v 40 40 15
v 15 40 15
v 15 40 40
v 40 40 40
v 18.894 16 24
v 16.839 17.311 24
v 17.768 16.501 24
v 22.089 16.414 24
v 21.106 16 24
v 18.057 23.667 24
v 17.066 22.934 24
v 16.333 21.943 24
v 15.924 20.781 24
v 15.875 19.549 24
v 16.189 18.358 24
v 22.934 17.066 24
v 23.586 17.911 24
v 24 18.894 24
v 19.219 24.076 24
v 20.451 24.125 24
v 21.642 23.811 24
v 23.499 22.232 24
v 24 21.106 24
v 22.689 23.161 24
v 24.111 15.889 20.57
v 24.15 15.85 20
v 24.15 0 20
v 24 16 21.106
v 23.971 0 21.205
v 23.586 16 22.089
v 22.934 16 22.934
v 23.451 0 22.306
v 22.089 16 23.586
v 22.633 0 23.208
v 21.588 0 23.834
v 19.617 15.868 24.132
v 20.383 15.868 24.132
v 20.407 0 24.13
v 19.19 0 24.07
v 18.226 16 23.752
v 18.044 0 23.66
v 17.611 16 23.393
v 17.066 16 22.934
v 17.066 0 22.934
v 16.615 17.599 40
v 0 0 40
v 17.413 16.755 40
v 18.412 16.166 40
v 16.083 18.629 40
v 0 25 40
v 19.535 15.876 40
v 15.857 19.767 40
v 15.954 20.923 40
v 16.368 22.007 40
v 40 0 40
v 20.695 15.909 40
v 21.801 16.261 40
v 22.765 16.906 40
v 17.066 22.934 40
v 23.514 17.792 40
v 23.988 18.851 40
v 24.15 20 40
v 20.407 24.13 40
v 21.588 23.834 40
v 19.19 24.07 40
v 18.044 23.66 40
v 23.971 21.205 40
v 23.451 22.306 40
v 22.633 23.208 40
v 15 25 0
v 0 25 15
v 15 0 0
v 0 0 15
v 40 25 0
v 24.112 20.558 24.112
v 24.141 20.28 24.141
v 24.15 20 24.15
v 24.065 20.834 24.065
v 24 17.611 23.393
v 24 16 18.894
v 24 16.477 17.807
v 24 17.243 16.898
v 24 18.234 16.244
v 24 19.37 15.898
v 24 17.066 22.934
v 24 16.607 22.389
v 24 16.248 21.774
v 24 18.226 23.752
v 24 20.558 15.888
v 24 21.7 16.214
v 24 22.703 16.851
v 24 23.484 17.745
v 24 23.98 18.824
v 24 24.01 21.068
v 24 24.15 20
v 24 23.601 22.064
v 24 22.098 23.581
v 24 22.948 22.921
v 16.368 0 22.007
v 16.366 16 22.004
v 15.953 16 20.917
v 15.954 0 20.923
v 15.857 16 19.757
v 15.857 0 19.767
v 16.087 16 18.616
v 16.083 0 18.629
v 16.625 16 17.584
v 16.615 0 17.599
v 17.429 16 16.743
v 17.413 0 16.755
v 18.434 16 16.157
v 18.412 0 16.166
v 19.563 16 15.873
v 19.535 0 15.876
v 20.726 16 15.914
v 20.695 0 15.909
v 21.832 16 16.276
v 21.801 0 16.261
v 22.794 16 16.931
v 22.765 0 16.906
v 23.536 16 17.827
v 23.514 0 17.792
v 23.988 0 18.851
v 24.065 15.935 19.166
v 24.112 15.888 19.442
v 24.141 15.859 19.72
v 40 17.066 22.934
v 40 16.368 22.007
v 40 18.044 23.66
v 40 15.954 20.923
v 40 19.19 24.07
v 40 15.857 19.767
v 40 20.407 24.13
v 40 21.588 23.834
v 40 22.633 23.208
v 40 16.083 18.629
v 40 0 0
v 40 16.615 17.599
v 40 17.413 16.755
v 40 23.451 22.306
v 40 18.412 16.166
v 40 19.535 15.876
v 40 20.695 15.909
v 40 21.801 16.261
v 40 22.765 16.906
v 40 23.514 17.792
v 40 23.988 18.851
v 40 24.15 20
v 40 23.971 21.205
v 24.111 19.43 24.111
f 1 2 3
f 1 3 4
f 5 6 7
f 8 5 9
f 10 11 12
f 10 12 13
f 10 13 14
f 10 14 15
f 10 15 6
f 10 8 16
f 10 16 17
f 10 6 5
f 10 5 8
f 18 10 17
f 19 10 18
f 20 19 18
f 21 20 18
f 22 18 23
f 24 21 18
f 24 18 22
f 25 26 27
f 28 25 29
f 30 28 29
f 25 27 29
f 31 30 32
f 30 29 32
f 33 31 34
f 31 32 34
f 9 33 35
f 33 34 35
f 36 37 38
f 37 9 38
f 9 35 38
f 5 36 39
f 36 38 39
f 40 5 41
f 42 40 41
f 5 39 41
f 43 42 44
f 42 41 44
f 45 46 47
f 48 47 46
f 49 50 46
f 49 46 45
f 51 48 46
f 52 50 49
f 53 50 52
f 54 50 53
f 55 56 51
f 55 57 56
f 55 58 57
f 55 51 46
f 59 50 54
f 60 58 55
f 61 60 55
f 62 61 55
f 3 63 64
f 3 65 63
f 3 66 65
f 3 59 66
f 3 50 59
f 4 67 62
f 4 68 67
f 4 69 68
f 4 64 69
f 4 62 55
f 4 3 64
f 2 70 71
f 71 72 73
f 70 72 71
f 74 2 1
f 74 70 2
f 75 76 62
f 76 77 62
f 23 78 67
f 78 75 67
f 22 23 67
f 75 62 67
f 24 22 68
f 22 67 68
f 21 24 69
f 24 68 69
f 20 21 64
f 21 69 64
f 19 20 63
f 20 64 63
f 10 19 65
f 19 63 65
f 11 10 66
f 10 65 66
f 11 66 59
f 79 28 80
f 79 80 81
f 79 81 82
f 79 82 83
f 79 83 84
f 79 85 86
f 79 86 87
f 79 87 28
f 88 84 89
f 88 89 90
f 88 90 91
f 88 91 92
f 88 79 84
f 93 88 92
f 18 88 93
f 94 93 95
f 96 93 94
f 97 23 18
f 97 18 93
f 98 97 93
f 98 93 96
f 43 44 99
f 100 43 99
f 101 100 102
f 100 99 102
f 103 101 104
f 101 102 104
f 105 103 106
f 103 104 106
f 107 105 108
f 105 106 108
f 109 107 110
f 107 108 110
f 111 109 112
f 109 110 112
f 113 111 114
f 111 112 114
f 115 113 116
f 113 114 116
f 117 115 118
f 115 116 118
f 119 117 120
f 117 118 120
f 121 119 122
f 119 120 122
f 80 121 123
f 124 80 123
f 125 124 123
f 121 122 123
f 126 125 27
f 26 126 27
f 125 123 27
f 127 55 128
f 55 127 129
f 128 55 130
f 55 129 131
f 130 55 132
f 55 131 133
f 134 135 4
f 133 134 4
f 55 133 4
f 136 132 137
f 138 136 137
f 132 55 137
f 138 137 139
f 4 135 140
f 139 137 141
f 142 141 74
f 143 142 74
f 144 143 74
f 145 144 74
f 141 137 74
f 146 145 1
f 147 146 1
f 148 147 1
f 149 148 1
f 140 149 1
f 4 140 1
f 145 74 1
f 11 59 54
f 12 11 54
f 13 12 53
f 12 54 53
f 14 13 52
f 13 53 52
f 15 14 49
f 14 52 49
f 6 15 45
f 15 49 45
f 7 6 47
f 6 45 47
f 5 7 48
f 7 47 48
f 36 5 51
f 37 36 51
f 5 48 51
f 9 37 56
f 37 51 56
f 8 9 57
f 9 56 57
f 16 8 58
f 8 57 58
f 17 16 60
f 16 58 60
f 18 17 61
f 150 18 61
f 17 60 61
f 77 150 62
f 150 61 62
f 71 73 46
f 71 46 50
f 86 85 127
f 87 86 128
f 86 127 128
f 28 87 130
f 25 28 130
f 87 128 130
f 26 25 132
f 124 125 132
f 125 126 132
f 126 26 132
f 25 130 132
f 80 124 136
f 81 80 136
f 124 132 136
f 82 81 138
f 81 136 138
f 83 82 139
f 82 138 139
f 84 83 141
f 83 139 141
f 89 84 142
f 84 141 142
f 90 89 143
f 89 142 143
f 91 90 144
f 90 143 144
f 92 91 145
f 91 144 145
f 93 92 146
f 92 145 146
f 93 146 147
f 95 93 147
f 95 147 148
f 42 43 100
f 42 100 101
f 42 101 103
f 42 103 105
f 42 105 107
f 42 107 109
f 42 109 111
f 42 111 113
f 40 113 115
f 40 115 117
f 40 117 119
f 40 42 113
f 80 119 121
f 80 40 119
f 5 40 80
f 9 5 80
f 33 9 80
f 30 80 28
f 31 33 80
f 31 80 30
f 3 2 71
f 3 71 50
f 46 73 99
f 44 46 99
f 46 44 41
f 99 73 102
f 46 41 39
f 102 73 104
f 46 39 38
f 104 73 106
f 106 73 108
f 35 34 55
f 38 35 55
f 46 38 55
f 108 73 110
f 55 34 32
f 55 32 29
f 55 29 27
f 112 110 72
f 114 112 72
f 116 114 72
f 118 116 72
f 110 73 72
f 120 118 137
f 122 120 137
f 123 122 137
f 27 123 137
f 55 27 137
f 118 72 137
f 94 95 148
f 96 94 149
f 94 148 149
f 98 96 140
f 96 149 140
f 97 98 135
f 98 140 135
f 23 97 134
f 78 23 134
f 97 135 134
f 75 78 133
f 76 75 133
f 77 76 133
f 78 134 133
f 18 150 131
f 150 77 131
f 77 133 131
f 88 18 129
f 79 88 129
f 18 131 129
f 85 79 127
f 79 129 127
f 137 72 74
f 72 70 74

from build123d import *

# Parameters (mm, degrees)
F0_W     = 40
F0_H     = 40
F1_DEPTH = 40
F3_DEPTH = 16
F5_DEPTH = 16
F7_DEPTH = 16
F8_SIZE  = 15


with BuildPart() as f1:
    # F0 (on Top) → F1 (new body)
    with BuildSketch(Plane.XY):
        with Locations((20, 20)):
            Rectangle(F0_W, F0_H)
    extrude(amount=F1_DEPTH)

    # F2 (on face) → F3 (cut)
    with BuildSketch(Plane.XZ):
        with BuildLine():
            ThreePointArc((24.15, 20), (21.5881362443, 23.8341000599), (17.0655068581, 22.9344931419))
            Line((17.0655068581, 22.9344931419), (22.9344931419, 17.0655068581))
            ThreePointArc((22.9344931419, 17.0655068581), (23.8341000599, 18.4118637557), (24.15, 20))
        make_face()
        with BuildLine():
            Line((22.9344931419, 17.0655068581), (17.0655068581, 22.9344931419))
            ThreePointArc((17.0655068581, 22.9344931419), (17.0655068581, 17.0655068581), (22.9344931419, 17.0655068581))
        make_face()
    extrude(amount=-F3_DEPTH, mode=Mode.SUBTRACT)

    # F4 (on face) → F5 (cut)
    with BuildSketch(Plane.YZ.offset(40)):
        with BuildLine():
            ThreePointArc((24.15, 20), (21.5881362443, 23.8341000599), (17.0655068581, 22.9344931419))
            Line((17.0655068581, 22.9344931419), (22.9344931419, 17.0655068581))
            ThreePointArc((22.9344931419, 17.0655068581), (23.8341000599, 18.4118637557), (24.15, 20))
        make_face()
        with BuildLine():
            Line((22.9344931419, 17.0655068581), (17.0655068581, 22.9344931419))
            ThreePointArc((17.0655068581, 22.9344931419), (17.0655068581, 17.0655068581), (22.9344931419, 17.0655068581))
        make_face()
    extrude(amount=-F5_DEPTH, mode=Mode.SUBTRACT)

    # F6 (on face) → F7 (cut)
    with BuildSketch(Plane.XY.offset(40)):
        with BuildLine():
            ThreePointArc((24.15, 20), (21.5881362443, 23.8341000599), (17.0655068581, 22.9344931419))
            Line((17.0655068581, 22.9344931419), (22.9344931419, 17.0655068581))
            ThreePointArc((22.9344931419, 17.0655068581), (23.8341000599, 18.4118637557), (24.15, 20))
        make_face()
        with BuildLine():
            Line((22.9344931419, 17.0655068581), (17.0655068581, 22.9344931419))
            ThreePointArc((17.0655068581, 22.9344931419), (17.0655068581, 17.0655068581), (22.9344931419, 17.0655068581))
        make_face()
    extrude(amount=-F7_DEPTH, mode=Mode.SUBTRACT)

    # F8
    f8_edges = [f1.edges().sort_by_distance(p)[0] for p in [
        (20, 40, 0),
        (0, 20, 0),
        (0, 40, 20),
    ]]
    chamfer(f8_edges, length=F8_SIZE)


solid = f1.part
